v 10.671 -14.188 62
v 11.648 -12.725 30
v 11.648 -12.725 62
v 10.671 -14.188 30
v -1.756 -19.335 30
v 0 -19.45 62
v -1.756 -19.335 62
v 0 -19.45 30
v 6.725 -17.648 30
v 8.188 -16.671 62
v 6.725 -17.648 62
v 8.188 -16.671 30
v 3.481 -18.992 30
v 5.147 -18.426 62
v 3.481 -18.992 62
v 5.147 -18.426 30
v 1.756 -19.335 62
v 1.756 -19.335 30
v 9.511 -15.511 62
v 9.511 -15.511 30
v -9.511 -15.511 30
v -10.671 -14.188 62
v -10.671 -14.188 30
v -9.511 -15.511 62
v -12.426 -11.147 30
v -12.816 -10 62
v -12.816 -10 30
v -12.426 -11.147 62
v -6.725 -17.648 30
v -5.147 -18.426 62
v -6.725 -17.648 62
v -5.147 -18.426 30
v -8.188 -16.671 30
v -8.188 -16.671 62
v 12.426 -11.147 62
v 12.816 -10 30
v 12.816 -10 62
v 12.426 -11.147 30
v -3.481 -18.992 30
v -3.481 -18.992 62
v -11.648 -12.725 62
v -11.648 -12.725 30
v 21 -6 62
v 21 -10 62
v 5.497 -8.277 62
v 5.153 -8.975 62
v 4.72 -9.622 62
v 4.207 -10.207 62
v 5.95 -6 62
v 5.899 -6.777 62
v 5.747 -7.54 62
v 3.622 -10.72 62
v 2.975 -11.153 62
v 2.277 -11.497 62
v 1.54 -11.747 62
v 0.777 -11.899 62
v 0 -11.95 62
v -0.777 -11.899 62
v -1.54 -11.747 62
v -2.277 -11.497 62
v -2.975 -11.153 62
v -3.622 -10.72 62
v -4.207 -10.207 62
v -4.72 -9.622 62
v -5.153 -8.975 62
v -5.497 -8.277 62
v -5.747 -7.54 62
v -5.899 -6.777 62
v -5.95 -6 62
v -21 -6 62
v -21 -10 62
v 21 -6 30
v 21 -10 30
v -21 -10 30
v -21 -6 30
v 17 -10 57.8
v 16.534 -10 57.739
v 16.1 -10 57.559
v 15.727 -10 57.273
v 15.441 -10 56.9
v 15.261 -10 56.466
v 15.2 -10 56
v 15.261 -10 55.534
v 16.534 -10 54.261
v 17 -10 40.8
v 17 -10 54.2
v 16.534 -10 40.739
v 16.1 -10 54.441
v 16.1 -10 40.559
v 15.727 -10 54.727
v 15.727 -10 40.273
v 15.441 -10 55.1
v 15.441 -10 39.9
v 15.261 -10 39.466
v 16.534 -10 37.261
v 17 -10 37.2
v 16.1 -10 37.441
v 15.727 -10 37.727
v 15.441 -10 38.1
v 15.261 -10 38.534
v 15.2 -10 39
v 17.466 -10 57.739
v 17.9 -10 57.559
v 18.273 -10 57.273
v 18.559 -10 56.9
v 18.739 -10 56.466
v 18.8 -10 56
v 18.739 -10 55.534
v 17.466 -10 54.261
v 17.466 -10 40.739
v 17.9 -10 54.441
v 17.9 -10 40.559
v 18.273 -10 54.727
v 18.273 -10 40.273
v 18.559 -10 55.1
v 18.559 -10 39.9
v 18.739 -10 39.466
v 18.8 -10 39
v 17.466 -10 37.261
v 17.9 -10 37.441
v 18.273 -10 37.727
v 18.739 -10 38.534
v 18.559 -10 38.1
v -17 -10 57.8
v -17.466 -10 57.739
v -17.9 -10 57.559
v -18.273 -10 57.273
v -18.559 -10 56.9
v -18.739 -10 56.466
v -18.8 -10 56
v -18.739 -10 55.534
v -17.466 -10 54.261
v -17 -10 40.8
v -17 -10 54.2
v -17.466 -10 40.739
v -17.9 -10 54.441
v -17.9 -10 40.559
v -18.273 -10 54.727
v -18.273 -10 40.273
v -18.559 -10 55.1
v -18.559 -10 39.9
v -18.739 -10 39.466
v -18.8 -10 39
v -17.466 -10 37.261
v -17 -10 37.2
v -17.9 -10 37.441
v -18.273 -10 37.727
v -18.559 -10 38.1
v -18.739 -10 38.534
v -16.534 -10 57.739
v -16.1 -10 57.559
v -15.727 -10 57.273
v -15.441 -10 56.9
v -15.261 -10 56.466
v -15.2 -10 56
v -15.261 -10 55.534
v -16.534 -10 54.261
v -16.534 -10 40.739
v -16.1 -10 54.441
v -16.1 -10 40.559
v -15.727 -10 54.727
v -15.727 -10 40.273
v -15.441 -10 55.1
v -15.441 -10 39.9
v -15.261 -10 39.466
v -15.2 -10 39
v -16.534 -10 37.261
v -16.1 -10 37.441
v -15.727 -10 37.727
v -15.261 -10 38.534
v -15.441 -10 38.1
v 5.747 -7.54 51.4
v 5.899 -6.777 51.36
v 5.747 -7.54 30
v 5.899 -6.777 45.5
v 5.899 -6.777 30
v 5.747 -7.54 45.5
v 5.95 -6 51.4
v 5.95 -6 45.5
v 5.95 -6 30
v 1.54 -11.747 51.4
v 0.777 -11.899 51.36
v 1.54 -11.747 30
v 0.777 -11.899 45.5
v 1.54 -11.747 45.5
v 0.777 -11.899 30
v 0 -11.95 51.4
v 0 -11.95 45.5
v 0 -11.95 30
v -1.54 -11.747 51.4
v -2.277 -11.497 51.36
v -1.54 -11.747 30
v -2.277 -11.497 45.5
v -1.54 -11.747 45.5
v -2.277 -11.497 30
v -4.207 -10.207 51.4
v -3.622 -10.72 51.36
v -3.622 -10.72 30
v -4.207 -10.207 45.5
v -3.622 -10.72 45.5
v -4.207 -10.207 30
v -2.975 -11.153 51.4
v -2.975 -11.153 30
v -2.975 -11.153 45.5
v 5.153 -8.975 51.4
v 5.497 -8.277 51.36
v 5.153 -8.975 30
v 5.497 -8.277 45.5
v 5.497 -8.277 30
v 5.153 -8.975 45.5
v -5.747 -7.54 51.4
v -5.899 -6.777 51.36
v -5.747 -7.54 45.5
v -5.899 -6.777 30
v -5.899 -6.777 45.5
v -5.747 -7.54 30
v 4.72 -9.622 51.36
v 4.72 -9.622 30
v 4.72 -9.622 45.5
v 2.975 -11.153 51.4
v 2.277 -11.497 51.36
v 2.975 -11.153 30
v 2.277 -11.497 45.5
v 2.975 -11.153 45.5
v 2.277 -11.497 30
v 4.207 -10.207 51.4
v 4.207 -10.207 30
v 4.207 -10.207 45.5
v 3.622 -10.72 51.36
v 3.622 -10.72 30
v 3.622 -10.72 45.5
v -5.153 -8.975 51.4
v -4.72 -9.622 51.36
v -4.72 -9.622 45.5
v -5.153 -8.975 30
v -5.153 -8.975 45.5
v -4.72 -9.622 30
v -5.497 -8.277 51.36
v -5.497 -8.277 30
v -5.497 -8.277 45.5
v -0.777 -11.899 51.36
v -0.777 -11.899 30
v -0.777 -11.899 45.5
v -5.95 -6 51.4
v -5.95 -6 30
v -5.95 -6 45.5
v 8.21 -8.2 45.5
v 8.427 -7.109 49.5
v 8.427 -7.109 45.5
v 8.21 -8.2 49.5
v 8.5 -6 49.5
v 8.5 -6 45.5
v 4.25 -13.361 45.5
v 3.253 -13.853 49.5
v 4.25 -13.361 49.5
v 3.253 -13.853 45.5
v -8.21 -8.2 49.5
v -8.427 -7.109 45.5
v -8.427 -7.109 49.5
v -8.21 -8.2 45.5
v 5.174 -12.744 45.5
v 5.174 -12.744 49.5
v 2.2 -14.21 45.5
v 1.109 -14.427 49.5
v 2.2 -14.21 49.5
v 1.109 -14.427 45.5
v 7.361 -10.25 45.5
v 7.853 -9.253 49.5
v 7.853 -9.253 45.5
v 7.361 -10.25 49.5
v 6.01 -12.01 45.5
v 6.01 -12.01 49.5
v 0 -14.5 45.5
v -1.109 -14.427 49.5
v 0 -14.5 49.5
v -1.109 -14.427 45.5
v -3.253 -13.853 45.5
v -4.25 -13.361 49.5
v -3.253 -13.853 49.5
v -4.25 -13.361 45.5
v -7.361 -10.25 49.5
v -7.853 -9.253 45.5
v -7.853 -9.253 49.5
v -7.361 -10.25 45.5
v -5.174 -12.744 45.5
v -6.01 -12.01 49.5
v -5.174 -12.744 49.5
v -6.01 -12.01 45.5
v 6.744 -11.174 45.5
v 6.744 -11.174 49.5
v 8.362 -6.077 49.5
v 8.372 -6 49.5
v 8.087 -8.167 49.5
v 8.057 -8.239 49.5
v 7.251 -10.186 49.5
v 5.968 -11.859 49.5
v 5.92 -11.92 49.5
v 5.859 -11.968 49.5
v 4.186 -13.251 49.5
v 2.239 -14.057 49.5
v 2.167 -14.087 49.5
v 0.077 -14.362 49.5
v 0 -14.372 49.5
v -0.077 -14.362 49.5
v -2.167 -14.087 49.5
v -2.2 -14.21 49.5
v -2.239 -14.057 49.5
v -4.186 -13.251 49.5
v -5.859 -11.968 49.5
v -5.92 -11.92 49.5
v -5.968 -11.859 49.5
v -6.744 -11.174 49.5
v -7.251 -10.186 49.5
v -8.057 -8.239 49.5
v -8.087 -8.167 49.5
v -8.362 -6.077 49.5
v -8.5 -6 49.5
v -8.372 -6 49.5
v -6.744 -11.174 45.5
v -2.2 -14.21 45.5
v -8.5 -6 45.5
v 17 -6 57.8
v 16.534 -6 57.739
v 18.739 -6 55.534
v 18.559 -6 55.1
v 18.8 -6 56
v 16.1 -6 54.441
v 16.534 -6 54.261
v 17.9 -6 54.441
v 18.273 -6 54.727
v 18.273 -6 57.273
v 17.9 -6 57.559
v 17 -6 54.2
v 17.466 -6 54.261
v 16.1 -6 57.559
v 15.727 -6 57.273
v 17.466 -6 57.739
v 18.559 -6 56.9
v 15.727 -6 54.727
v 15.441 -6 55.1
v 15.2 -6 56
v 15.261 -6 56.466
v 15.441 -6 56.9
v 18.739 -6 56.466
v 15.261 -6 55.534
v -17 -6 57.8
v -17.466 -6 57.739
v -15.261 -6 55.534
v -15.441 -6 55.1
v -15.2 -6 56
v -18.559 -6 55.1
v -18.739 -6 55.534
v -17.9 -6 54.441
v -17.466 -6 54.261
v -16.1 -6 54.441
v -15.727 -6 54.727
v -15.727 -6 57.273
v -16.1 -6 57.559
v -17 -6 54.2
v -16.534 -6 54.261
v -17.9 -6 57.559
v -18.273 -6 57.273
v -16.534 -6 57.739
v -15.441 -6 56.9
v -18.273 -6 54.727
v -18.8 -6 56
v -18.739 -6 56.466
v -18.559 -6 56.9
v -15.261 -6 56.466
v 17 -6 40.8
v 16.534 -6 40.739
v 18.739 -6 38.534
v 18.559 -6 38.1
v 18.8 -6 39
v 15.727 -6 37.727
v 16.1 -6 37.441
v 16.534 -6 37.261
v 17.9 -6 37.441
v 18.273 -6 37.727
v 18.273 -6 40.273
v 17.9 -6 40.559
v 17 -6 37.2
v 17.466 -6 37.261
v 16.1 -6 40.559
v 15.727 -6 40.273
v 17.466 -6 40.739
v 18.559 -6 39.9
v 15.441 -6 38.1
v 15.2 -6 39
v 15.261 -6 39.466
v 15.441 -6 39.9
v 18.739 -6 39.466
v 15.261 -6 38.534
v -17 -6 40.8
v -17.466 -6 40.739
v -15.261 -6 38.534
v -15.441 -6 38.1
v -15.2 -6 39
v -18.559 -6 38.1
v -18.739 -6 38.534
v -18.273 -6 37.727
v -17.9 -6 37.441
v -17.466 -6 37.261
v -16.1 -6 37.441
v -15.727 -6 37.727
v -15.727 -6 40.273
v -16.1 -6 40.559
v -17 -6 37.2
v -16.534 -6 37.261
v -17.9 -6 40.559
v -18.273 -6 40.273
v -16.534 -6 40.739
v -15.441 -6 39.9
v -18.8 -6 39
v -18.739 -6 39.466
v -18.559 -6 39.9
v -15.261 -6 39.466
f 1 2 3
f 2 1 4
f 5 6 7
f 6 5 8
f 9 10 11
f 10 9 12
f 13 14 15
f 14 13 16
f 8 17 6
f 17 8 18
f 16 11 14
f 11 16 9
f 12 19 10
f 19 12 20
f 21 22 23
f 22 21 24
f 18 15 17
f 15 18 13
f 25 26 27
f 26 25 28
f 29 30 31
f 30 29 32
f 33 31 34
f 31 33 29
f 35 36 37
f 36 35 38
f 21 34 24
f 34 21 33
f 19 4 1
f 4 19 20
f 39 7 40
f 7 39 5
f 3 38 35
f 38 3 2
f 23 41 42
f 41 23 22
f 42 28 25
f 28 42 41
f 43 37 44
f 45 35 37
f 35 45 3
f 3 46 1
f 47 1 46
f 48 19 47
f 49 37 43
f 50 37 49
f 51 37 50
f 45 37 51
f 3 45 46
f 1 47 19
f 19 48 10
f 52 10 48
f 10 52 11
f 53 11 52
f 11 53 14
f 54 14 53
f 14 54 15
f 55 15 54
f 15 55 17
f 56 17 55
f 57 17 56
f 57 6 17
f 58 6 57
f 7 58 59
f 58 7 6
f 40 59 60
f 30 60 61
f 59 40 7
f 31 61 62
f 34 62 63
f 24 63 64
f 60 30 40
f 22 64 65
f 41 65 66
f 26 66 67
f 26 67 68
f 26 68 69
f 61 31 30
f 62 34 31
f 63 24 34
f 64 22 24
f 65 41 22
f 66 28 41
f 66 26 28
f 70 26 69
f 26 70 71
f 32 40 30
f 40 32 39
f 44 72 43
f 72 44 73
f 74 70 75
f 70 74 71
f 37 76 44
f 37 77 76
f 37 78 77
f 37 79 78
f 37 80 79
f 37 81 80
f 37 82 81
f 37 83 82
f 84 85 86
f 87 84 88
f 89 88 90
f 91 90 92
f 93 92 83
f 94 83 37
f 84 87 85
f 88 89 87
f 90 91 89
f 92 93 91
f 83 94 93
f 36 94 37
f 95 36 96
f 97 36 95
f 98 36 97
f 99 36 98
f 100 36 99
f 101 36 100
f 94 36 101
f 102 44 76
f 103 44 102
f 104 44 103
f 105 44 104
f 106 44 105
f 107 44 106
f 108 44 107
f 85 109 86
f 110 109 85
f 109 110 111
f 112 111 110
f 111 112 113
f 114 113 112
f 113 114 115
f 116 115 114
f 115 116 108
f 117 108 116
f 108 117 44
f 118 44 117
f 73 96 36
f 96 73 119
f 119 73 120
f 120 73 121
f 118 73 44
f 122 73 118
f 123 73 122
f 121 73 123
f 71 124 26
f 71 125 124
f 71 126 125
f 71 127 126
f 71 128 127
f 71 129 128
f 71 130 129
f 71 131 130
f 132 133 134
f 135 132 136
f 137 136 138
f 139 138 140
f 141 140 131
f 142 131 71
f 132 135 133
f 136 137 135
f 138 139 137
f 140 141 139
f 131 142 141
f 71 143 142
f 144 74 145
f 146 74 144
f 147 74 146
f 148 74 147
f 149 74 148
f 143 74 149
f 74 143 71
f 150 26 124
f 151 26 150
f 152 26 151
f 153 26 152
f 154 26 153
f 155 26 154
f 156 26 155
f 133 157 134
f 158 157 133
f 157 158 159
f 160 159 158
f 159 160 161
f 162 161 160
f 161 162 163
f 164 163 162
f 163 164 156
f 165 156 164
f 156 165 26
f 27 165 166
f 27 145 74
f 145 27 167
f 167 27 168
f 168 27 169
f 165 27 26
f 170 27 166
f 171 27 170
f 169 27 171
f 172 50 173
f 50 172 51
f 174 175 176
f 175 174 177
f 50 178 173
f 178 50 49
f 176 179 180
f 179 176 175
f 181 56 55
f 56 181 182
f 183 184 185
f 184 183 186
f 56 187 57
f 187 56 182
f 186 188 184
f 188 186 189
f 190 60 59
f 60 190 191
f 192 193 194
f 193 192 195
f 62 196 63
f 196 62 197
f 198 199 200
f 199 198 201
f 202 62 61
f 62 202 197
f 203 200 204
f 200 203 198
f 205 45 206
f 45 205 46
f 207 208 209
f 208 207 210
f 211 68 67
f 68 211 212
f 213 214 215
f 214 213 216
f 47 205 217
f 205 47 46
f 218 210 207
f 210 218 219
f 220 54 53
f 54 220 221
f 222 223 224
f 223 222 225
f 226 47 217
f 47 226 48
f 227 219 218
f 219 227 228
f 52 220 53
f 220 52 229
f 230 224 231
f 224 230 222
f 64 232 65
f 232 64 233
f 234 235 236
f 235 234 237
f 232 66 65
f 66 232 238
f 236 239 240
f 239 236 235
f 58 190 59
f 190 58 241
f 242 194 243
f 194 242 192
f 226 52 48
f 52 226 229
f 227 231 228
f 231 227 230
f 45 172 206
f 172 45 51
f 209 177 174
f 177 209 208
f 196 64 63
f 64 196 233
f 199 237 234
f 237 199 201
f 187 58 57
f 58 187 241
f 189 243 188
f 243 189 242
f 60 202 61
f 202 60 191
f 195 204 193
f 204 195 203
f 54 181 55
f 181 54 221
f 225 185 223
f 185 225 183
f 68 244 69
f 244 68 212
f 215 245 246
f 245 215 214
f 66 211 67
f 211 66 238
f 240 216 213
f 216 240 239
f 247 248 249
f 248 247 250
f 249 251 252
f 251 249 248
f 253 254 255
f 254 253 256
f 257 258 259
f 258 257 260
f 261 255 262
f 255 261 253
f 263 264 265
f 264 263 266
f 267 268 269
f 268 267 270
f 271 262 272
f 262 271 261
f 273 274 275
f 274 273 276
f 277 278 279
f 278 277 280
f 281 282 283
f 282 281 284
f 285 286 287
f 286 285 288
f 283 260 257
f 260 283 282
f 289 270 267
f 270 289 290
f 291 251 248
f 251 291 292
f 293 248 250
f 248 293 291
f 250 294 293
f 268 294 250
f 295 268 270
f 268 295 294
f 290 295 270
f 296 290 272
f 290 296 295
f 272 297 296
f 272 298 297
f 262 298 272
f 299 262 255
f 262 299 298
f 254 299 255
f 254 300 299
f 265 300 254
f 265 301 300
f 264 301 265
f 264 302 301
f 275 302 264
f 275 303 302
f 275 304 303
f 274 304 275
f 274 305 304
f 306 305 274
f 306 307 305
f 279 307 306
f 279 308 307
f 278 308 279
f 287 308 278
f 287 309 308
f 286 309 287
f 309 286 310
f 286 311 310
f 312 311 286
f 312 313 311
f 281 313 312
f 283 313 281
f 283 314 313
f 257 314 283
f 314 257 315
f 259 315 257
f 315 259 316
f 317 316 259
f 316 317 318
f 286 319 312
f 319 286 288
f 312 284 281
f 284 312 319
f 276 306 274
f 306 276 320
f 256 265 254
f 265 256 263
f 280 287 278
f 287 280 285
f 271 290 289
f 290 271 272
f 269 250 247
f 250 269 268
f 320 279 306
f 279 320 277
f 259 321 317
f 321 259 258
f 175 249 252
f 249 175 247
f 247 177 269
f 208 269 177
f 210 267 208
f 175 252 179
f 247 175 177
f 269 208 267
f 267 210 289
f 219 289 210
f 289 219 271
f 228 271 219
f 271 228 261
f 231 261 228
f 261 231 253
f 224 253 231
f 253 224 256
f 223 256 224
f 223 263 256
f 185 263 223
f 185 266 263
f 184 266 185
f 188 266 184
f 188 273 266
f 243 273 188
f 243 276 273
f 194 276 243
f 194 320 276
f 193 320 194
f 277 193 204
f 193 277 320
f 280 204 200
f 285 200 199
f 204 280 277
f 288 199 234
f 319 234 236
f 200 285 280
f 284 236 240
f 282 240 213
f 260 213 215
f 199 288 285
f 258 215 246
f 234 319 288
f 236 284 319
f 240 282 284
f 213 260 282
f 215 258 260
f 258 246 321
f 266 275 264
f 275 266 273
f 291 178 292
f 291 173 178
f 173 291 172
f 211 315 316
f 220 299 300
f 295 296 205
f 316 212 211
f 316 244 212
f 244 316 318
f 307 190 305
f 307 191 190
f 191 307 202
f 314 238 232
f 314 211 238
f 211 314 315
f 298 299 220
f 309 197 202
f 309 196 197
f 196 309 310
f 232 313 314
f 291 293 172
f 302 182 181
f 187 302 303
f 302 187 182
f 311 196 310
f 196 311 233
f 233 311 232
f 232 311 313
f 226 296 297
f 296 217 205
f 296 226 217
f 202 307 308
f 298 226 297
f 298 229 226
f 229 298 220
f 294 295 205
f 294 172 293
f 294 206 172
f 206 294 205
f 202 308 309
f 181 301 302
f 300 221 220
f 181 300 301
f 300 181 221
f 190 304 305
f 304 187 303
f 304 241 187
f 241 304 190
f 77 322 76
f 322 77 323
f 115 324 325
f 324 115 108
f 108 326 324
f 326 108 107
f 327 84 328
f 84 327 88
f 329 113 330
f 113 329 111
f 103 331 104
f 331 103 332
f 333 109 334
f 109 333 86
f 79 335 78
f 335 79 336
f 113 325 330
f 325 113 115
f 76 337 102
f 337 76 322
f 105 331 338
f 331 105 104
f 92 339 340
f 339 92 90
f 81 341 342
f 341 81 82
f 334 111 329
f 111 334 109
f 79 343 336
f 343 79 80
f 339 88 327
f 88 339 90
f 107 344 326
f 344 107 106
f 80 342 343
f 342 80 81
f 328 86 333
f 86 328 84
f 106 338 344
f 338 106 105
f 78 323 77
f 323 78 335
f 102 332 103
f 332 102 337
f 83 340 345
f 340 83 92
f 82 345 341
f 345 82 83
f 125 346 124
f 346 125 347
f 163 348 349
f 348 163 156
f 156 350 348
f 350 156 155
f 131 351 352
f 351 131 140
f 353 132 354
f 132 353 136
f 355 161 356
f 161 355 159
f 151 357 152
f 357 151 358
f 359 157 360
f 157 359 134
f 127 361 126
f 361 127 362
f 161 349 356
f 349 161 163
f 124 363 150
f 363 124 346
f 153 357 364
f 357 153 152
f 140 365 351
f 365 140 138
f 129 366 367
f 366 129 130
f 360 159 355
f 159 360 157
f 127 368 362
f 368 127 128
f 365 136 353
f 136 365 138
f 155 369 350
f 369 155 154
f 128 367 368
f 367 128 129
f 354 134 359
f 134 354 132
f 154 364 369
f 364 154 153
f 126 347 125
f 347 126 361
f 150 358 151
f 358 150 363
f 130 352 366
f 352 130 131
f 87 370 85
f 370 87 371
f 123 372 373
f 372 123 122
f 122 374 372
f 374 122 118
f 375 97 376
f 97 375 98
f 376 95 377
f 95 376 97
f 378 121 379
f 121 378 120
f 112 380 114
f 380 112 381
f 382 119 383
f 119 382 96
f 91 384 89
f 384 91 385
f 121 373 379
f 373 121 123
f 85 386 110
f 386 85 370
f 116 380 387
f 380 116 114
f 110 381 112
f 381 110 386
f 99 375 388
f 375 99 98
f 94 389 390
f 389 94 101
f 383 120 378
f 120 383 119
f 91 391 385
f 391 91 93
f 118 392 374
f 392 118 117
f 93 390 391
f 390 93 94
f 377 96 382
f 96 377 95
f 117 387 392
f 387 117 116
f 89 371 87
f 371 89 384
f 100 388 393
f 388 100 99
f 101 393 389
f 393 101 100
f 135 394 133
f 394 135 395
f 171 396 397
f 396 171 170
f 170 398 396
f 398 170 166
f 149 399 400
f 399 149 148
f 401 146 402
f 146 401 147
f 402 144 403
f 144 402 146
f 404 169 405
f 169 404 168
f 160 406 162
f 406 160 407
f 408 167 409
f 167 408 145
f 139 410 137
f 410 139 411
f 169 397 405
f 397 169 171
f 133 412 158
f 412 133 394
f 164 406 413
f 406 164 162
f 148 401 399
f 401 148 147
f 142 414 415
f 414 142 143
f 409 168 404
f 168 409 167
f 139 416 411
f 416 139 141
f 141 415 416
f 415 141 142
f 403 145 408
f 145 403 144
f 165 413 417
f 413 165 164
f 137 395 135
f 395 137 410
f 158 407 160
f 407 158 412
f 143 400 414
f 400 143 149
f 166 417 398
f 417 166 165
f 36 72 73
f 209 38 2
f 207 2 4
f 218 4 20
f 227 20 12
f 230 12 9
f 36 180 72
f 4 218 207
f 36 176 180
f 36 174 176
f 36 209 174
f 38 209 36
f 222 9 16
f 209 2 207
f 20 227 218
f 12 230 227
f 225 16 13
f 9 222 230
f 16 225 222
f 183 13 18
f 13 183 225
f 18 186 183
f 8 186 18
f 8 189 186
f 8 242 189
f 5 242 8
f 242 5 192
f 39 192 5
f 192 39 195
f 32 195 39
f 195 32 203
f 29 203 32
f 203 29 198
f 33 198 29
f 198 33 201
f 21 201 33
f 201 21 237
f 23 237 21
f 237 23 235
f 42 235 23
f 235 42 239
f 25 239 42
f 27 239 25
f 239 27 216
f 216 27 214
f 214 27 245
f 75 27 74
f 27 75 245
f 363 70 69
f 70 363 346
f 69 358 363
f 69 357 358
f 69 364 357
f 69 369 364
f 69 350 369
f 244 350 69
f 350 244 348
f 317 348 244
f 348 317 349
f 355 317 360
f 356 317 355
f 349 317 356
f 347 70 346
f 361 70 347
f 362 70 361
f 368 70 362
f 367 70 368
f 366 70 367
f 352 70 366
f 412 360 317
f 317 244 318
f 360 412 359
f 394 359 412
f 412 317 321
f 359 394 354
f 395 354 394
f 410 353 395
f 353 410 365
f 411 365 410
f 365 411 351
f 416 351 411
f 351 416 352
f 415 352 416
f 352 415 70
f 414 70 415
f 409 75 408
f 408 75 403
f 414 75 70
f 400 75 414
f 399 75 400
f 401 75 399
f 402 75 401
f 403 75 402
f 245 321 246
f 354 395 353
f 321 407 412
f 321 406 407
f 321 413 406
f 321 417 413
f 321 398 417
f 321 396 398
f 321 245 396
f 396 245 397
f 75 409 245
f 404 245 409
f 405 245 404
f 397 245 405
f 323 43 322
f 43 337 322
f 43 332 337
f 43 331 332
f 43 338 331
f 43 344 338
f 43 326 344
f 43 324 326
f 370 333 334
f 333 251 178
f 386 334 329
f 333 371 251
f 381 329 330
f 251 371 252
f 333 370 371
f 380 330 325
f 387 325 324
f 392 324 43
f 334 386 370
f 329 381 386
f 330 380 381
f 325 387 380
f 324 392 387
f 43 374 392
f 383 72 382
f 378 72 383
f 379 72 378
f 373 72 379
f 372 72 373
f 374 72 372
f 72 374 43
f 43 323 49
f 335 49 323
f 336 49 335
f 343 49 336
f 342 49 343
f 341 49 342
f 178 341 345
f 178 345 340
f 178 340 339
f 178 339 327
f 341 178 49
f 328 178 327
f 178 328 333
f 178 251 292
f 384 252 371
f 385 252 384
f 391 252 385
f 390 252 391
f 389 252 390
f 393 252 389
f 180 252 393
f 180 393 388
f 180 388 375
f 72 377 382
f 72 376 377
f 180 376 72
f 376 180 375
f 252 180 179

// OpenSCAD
// 30 07 2020 2 LM6UU on each side:
// Option to close the cutter holder with 4 M3 bolds and nuts.abs
// Fixing with ties is even so good.
// The cutter holder can also serve as pen holder but not inverse.

   DiaM3=3.6; // fix  with M3 
   DiaCutter=11.9;  //11.8
   Height=74;   


   color("lime")          
         
 rotate([180,0,0])  //180 no need to rotate in Slic3R        
   {        
difference()
{ 
  union()
  {                    
      // Central Pen - Cutter holder      
     translate([0,6,-25.0])  // -1.5  
       cylinder(h=Height ,d=DiaCutter+10+5 ,center=true,$fn=48);  //
      
     // makes closing with M3 possible
     translate([0,6,-25.0])  // -1.5  
       cube([42,8 ,Height ] ,center=true);  
  }    
   // END UNION
  
//  Central cutter holder:

translate([0,6,-25])
       cylinder(h=Height*3 ,d=DiaCutter,center=true,$fn=48);  
     
  
// Thickest part of cutter holder:
  
translate([0,6,-22.5-25])
       cylinder(h=4.0 ,d=16.75+0.25,center=true,$fn=48);  //17 is ok for cutter
    
 // Funnel makes it printable without support
  
translate([0,6,-25.4-25])
       cylinder(h=2 ,d2=16.75+0.25,d1=DiaCutter,center=true,$fn=24); 
        
  // ties or M3 pair down:  
  
  translate([17,6,-56])     //-31
  rotate([90,0,0]) 
  cylinder(h=20 ,d=DiaM3,center=true,$fn=24);  // 
      
  translate([-17,6,-56])     //
  rotate([90,0,0])  
  cylinder(h=20 ,d=DiaM3,center=true,$fn=24);  // 
     
  
//  ties or M3 higher
    
  translate([17,6,-39])     //-14
  rotate([90,0,0])   
  cylinder(h=20 ,d=DiaM3,center=true,$fn=24);  // 
   
  translate([-17,6,-39])     //
  rotate([90,0,0]) 
  cylinder(h=20 ,d=DiaM3,center=true,$fn=24);  // 
      
  
  // top cutter holder removal :
 
 translate([0,15,0])
  cube([58,20,60],center=true);
  
  // removal 
     translate([0,-1,-25])
  cube([43,14,80],center=true);  
    
    }
 }  // end rotate
         
         
